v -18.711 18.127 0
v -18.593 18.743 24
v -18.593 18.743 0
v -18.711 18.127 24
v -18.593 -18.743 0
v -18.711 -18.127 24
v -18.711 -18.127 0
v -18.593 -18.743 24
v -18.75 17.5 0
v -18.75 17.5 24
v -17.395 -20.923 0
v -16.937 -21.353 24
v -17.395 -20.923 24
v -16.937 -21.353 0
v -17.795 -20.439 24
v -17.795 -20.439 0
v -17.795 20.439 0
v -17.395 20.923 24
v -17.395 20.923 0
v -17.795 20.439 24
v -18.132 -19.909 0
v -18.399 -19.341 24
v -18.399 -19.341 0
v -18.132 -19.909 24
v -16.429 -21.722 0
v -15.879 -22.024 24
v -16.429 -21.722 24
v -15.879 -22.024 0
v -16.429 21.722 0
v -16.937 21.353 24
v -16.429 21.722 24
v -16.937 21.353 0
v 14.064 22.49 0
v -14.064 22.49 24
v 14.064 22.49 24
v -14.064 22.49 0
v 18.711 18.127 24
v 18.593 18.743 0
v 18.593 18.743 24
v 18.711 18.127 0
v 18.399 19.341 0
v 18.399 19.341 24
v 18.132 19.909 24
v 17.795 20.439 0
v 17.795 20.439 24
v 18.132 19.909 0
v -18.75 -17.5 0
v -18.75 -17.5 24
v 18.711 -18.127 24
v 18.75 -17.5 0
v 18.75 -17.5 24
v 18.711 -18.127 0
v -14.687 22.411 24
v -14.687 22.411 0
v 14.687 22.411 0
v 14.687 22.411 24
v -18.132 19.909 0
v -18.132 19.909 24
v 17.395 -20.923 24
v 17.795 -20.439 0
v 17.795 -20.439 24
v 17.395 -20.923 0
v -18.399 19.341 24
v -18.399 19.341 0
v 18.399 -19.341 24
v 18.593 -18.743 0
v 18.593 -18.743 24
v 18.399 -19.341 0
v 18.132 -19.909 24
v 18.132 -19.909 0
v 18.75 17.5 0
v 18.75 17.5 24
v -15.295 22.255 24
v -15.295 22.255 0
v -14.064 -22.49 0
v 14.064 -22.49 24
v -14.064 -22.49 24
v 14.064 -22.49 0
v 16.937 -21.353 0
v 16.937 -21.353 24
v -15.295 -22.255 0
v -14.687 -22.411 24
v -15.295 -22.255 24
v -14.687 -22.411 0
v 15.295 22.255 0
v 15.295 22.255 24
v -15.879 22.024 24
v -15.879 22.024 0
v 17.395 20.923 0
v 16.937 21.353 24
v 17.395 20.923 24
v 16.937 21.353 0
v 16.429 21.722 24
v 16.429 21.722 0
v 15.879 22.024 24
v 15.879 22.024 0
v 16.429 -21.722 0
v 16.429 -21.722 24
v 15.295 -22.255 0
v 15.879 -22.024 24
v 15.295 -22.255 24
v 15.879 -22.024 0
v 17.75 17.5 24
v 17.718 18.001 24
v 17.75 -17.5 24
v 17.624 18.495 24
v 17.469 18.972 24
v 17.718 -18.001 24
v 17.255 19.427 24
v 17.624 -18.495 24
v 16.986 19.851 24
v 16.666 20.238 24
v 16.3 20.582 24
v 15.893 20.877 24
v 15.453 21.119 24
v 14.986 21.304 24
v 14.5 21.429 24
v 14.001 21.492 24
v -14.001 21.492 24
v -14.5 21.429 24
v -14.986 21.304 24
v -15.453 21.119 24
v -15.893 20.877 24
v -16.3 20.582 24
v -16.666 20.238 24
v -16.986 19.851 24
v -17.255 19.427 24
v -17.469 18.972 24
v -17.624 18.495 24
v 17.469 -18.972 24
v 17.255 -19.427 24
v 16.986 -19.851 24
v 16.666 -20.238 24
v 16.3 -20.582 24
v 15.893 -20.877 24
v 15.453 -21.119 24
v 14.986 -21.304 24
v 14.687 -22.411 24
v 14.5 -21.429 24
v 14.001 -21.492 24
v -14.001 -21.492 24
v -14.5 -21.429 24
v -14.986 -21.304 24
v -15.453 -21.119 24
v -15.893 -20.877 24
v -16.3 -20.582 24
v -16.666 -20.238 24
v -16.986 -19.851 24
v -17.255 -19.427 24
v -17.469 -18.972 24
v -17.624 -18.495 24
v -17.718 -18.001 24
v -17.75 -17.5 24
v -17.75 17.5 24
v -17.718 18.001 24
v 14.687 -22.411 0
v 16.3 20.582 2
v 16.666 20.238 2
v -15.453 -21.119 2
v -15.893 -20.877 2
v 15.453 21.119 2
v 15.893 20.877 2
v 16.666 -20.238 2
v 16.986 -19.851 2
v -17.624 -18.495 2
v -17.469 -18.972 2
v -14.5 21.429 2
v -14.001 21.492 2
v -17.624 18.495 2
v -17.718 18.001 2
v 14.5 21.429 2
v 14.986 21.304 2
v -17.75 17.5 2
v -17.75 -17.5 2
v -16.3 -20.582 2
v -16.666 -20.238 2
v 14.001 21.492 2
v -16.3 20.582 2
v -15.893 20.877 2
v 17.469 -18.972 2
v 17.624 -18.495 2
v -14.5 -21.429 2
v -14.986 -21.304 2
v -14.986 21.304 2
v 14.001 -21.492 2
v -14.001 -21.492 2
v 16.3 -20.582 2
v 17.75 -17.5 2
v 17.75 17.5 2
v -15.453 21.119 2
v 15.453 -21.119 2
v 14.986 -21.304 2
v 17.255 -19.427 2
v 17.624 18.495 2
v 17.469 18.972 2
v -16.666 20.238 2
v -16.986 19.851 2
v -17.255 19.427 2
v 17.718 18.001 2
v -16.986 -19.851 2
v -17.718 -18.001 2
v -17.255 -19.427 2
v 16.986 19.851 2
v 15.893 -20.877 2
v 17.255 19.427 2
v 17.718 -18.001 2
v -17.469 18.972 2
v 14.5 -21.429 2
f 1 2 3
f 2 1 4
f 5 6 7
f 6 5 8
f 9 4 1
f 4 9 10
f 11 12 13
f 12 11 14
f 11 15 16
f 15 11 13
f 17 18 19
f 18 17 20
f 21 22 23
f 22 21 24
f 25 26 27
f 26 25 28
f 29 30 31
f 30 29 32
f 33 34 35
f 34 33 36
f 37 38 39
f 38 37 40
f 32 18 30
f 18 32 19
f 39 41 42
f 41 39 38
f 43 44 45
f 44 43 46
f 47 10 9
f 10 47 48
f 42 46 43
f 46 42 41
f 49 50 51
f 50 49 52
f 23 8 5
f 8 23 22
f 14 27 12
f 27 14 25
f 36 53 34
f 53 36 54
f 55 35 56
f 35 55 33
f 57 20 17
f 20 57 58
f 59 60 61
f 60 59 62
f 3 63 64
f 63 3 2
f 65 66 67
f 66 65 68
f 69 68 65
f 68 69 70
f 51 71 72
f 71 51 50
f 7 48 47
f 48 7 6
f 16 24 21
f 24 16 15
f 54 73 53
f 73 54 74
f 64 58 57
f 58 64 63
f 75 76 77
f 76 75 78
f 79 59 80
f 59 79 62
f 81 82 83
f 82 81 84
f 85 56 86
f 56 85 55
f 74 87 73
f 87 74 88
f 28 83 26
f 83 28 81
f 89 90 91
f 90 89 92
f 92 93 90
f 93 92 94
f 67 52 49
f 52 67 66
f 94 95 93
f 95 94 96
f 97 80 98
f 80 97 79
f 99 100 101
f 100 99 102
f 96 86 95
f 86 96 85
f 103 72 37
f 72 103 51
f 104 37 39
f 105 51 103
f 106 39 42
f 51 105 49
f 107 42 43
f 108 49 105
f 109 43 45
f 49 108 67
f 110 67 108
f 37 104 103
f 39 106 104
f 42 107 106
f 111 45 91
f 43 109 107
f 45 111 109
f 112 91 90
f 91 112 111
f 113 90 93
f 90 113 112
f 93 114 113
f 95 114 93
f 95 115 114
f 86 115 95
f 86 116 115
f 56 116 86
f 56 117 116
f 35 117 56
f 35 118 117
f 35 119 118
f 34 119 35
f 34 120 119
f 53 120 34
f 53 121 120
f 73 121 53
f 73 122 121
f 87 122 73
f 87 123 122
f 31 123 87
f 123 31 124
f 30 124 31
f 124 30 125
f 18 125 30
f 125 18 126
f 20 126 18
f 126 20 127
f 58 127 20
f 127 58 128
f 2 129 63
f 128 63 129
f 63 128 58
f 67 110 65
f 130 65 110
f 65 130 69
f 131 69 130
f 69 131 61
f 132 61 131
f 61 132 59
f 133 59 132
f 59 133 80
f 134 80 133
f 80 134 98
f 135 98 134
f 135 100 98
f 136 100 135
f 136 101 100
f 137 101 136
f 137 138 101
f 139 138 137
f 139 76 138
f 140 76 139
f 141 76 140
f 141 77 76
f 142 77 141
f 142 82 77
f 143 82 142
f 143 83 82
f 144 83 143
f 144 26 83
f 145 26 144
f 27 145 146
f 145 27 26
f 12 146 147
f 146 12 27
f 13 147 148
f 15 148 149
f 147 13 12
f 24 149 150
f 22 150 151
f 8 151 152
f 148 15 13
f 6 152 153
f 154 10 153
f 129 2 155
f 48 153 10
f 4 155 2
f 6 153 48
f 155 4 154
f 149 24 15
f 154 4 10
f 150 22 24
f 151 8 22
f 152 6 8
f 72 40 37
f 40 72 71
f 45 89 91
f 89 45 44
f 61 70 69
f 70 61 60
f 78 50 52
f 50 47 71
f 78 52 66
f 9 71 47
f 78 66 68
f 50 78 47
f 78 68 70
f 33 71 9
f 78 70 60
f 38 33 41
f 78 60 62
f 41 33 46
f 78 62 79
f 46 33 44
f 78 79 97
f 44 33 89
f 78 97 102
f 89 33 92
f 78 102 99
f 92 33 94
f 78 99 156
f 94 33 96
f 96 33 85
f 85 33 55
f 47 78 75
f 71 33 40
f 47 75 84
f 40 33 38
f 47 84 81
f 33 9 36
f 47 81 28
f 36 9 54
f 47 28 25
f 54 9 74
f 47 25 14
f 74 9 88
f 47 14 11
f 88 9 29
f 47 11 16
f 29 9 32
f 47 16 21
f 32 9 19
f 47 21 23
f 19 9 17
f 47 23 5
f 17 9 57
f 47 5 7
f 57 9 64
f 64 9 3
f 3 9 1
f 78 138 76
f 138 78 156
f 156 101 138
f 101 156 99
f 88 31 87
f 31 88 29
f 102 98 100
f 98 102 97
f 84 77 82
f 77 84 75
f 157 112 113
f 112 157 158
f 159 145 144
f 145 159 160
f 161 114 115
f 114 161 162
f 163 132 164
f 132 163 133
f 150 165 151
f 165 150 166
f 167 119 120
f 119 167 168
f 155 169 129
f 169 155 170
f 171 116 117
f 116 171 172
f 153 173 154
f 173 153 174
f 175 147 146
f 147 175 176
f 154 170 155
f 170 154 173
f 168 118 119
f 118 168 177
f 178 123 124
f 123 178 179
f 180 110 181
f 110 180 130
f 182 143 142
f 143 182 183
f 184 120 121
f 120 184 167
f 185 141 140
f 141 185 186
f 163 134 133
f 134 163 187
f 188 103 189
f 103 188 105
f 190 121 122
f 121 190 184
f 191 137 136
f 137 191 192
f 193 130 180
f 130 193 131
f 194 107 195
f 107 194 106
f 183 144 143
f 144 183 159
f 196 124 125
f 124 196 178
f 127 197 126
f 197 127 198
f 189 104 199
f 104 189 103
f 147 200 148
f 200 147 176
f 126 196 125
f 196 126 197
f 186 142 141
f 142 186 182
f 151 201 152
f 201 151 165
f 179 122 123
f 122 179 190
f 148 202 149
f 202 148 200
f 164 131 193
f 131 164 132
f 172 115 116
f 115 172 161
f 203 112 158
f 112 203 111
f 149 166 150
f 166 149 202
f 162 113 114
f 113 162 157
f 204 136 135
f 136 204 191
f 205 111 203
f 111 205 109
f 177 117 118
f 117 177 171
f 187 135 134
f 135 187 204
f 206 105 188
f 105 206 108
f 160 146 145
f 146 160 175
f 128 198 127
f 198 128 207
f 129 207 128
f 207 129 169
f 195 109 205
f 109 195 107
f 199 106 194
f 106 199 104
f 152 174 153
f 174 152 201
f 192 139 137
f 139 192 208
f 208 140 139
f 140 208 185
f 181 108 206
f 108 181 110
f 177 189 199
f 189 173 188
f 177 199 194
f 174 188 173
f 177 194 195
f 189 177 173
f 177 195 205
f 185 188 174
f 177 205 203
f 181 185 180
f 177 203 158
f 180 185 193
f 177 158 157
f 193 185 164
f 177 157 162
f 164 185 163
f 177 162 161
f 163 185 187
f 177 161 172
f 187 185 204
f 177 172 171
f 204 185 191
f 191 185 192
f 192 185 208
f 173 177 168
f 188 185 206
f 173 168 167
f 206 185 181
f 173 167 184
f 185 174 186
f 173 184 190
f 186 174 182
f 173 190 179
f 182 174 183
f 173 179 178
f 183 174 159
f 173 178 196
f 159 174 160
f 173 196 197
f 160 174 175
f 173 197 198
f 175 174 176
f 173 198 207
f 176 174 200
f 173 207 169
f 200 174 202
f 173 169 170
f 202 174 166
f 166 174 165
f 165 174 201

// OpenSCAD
$fn = 50;


difference() {
	union() {
		hull() {
			translate(v = [-13.7500000000, 17.5000000000, 0]) {
				cylinder(h = 24, r = 5);
			}
			translate(v = [13.7500000000, 17.5000000000, 0]) {
				cylinder(h = 24, r = 5);
			}
			translate(v = [-13.7500000000, -17.5000000000, 0]) {
				cylinder(h = 24, r = 5);
			}
			translate(v = [13.7500000000, -17.5000000000, 0]) {
				cylinder(h = 24, r = 5);
			}
		}
	}
	union() {
		translate(v = [0, 0, 2]) {
			hull() {
				translate(v = [-13.7500000000, 17.5000000000, 0]) {
					cylinder(h = 22, r = 4);
				}
				translate(v = [13.7500000000, 17.5000000000, 0]) {
					cylinder(h = 22, r = 4);
				}
				translate(v = [-13.7500000000, -17.5000000000, 0]) {
					cylinder(h = 22, r = 4);
				}
				translate(v = [13.7500000000, -17.5000000000, 0]) {
					cylinder(h = 22, r = 4);
				}
			}
		}
	}
}
